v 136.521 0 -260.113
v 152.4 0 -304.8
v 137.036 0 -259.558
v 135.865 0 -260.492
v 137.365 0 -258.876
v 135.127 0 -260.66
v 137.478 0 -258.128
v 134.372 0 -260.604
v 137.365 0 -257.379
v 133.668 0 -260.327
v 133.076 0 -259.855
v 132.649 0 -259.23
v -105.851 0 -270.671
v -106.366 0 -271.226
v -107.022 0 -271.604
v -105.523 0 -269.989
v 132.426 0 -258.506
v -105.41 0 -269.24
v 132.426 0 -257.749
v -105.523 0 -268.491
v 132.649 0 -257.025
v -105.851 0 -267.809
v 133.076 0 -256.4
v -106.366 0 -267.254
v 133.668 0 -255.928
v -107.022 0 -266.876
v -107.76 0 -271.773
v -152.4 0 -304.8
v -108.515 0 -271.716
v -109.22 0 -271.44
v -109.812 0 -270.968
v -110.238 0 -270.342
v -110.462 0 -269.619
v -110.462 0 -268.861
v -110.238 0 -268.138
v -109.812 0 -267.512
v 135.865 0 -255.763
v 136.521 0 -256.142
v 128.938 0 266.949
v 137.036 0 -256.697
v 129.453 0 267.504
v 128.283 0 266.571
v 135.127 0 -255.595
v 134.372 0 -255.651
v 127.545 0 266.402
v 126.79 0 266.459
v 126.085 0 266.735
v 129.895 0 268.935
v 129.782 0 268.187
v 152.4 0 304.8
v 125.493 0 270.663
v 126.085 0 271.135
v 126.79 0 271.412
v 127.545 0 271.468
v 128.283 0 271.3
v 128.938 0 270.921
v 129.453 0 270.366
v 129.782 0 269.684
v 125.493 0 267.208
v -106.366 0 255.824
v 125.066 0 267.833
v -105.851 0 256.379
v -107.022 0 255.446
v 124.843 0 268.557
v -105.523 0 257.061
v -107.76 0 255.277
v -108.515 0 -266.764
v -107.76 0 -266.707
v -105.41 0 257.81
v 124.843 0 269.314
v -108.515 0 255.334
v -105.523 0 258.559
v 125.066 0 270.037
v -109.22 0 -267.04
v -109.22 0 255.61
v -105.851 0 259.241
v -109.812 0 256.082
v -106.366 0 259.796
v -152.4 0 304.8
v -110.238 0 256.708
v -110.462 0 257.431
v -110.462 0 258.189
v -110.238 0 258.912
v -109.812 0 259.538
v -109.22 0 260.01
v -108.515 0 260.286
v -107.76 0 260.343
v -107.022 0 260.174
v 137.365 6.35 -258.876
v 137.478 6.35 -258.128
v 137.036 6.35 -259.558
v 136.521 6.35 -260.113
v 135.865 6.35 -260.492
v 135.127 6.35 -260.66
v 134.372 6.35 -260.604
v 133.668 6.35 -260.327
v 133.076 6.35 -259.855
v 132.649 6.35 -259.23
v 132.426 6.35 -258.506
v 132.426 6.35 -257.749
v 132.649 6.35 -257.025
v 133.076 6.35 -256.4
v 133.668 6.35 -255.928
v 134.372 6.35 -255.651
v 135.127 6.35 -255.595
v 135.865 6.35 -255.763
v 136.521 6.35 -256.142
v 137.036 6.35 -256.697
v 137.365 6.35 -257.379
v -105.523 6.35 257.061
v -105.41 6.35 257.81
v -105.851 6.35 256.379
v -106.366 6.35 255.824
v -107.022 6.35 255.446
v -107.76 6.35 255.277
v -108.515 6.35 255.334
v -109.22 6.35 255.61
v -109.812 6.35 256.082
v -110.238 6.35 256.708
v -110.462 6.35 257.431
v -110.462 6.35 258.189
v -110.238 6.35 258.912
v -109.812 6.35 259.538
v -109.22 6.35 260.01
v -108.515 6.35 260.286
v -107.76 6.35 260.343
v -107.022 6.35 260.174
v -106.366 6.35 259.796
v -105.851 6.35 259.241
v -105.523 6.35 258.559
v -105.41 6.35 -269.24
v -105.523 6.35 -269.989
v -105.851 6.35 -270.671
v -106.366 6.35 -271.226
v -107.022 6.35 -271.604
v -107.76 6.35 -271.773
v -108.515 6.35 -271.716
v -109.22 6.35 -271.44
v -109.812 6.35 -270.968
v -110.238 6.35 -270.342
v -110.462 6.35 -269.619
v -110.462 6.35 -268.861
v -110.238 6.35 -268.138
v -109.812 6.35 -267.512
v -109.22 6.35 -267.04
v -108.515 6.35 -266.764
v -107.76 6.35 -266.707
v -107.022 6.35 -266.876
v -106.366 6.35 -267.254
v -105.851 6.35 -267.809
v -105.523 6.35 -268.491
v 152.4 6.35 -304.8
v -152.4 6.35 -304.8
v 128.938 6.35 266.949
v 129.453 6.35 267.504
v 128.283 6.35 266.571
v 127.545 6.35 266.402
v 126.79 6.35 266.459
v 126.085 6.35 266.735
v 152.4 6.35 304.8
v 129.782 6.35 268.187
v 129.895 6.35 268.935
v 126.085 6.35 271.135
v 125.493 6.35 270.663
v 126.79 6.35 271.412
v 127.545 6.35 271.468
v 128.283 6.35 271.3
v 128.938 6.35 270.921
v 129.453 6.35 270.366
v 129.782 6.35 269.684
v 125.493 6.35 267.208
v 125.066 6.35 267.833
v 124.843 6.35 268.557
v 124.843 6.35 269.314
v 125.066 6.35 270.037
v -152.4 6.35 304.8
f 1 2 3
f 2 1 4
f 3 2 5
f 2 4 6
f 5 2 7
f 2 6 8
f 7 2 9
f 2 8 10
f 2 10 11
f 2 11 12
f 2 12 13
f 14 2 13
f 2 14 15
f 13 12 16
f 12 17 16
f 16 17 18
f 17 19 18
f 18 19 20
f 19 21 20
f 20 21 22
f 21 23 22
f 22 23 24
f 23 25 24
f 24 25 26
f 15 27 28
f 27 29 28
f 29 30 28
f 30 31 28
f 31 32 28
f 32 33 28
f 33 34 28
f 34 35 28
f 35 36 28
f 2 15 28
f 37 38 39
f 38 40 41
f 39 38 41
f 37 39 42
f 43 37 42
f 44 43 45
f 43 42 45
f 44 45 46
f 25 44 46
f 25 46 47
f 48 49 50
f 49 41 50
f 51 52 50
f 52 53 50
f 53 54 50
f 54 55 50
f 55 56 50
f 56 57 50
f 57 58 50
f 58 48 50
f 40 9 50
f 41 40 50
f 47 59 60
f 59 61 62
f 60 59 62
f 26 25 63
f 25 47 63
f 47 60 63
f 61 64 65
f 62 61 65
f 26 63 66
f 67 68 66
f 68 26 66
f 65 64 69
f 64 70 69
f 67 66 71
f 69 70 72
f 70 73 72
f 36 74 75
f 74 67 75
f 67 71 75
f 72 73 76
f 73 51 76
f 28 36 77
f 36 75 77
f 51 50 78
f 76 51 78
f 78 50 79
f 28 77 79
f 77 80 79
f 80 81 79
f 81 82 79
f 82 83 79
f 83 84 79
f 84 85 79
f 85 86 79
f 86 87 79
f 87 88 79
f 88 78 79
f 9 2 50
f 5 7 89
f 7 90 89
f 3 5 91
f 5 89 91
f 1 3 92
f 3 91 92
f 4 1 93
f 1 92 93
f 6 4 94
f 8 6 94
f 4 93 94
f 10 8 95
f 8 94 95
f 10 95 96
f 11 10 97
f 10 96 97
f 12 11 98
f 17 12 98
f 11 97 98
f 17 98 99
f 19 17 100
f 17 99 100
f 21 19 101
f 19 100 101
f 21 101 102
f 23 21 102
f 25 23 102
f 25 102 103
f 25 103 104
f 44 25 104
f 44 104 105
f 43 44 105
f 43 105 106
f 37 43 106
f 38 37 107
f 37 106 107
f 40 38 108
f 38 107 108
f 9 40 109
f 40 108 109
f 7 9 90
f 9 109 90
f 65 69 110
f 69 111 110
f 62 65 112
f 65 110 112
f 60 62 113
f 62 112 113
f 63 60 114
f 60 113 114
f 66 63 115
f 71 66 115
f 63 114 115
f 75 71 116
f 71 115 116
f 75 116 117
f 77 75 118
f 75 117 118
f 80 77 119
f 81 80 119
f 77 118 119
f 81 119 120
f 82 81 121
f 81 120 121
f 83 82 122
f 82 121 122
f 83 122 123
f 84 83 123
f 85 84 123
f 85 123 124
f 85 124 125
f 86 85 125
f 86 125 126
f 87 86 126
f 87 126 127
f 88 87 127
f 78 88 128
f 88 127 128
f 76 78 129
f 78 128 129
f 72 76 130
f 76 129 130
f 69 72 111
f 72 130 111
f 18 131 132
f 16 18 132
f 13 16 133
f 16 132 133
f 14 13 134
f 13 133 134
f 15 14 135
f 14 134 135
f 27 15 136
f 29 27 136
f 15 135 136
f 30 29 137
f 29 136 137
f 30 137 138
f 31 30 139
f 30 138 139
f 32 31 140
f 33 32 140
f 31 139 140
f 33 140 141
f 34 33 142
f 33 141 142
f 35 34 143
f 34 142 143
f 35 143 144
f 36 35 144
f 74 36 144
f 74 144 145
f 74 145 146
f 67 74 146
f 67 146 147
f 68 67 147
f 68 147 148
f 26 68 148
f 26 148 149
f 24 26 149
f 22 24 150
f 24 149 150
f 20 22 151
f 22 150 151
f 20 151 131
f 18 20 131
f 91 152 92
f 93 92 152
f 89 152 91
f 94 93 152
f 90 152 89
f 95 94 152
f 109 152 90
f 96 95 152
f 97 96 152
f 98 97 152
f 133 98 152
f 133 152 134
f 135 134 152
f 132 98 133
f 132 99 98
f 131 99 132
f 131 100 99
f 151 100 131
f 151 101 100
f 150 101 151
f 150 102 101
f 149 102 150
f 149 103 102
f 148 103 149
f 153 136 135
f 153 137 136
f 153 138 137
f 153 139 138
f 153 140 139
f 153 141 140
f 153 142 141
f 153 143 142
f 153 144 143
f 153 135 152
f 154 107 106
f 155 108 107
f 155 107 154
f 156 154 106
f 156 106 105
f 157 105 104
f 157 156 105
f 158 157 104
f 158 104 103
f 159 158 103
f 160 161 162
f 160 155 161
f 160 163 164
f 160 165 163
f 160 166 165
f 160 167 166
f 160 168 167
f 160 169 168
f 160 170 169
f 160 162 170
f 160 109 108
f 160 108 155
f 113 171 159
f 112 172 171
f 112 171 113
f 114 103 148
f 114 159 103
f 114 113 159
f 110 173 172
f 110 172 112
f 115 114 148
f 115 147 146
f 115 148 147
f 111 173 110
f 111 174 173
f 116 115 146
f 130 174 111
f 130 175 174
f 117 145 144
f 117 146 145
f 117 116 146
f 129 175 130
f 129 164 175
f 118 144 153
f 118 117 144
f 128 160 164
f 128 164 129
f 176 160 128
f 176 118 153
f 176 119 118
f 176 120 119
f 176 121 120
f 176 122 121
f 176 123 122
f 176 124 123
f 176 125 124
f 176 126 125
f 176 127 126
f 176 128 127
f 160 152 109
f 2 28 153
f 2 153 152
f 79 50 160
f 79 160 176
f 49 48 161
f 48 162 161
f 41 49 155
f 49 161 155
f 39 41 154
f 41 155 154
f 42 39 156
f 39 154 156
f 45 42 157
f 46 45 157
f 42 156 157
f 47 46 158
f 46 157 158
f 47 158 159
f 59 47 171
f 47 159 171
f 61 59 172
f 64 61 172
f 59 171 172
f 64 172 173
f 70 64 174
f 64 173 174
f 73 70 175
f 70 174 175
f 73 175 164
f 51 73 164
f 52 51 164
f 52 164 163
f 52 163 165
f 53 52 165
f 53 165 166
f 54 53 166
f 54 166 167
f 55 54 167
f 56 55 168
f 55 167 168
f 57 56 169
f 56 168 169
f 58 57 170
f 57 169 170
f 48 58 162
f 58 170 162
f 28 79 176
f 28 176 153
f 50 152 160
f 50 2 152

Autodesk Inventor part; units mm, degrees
ref_plane "YZ Plane" through (0, 0, 0) normal (1, 0, 0) x (0, 1, 0)
ref_plane "XZ Plane" through (0, 0, 0) normal (0, 1, 0) x (-1, 0, 0)
ref_plane "XY Plane" through (0, 0, 0) normal (0, 0, 1) x (1, 0, 0)
sketch "Sketch1" plane through (0, 0, 0) normal (0, 1, 0) x (-1, 0, 0)
  line L0 (-152.4, 304.8) -> (152.4, 304.8)
  line L1 (152.4, 304.8) -> (152.4, -304.8)
  line L2 (152.4, -304.8) -> (-152.4, -304.8)
  line L3 (-152.4, -304.8) -> (-152.4, 304.8)
  line L4 (-152.4, 304.8) -> (152.4, -304.8) construction
  line L5 (152.4, 304.8) -> (-152.4, -304.8) construction
  point P0 (0, 0)
  dimension "d0" = 609.6
  dimension "d1" = 304.8
extrude "Extrusion1" add sketch "Sketch1" along normal blind 6.35
sketch "Sketch2" plane through (0, 6.35, 0) normal (0, 1, 0) x (1, 0, 0)
  circle A0 centre (-107.95, 269.24) radius 2.54
  circle A1 centre (134.9375, 258.1275) radius 2.54
  line L0 (152.4, 304.8) -> (-152.4, 304.8) projected
  line L1 (-152.4, 304.8) -> (-152.4, -304.8) projected
  circle A2 centre (-107.95, -257.81) radius 2.54
  circle A3 centre (127.3548, -268.9352) radius 2.54
  point P0 (0, 0)
  dimension "d4" = 242.8875
  dimension "d8" = 44.45
  dimension "d9" = 11.1252
  dimension "d10" = 527.05
  dimension "d11" = 5.08
  dimension "d12" = 5.08
  dimension "d13" = 5.08
  dimension "d14" = 5.08
  dimension "d15" = 11.1125
  dimension "d16" = 35.56
extrude "Extrusion2" cut sketch "Sketch2" against normal up to next
properties part number "OdorMachineShelf"
